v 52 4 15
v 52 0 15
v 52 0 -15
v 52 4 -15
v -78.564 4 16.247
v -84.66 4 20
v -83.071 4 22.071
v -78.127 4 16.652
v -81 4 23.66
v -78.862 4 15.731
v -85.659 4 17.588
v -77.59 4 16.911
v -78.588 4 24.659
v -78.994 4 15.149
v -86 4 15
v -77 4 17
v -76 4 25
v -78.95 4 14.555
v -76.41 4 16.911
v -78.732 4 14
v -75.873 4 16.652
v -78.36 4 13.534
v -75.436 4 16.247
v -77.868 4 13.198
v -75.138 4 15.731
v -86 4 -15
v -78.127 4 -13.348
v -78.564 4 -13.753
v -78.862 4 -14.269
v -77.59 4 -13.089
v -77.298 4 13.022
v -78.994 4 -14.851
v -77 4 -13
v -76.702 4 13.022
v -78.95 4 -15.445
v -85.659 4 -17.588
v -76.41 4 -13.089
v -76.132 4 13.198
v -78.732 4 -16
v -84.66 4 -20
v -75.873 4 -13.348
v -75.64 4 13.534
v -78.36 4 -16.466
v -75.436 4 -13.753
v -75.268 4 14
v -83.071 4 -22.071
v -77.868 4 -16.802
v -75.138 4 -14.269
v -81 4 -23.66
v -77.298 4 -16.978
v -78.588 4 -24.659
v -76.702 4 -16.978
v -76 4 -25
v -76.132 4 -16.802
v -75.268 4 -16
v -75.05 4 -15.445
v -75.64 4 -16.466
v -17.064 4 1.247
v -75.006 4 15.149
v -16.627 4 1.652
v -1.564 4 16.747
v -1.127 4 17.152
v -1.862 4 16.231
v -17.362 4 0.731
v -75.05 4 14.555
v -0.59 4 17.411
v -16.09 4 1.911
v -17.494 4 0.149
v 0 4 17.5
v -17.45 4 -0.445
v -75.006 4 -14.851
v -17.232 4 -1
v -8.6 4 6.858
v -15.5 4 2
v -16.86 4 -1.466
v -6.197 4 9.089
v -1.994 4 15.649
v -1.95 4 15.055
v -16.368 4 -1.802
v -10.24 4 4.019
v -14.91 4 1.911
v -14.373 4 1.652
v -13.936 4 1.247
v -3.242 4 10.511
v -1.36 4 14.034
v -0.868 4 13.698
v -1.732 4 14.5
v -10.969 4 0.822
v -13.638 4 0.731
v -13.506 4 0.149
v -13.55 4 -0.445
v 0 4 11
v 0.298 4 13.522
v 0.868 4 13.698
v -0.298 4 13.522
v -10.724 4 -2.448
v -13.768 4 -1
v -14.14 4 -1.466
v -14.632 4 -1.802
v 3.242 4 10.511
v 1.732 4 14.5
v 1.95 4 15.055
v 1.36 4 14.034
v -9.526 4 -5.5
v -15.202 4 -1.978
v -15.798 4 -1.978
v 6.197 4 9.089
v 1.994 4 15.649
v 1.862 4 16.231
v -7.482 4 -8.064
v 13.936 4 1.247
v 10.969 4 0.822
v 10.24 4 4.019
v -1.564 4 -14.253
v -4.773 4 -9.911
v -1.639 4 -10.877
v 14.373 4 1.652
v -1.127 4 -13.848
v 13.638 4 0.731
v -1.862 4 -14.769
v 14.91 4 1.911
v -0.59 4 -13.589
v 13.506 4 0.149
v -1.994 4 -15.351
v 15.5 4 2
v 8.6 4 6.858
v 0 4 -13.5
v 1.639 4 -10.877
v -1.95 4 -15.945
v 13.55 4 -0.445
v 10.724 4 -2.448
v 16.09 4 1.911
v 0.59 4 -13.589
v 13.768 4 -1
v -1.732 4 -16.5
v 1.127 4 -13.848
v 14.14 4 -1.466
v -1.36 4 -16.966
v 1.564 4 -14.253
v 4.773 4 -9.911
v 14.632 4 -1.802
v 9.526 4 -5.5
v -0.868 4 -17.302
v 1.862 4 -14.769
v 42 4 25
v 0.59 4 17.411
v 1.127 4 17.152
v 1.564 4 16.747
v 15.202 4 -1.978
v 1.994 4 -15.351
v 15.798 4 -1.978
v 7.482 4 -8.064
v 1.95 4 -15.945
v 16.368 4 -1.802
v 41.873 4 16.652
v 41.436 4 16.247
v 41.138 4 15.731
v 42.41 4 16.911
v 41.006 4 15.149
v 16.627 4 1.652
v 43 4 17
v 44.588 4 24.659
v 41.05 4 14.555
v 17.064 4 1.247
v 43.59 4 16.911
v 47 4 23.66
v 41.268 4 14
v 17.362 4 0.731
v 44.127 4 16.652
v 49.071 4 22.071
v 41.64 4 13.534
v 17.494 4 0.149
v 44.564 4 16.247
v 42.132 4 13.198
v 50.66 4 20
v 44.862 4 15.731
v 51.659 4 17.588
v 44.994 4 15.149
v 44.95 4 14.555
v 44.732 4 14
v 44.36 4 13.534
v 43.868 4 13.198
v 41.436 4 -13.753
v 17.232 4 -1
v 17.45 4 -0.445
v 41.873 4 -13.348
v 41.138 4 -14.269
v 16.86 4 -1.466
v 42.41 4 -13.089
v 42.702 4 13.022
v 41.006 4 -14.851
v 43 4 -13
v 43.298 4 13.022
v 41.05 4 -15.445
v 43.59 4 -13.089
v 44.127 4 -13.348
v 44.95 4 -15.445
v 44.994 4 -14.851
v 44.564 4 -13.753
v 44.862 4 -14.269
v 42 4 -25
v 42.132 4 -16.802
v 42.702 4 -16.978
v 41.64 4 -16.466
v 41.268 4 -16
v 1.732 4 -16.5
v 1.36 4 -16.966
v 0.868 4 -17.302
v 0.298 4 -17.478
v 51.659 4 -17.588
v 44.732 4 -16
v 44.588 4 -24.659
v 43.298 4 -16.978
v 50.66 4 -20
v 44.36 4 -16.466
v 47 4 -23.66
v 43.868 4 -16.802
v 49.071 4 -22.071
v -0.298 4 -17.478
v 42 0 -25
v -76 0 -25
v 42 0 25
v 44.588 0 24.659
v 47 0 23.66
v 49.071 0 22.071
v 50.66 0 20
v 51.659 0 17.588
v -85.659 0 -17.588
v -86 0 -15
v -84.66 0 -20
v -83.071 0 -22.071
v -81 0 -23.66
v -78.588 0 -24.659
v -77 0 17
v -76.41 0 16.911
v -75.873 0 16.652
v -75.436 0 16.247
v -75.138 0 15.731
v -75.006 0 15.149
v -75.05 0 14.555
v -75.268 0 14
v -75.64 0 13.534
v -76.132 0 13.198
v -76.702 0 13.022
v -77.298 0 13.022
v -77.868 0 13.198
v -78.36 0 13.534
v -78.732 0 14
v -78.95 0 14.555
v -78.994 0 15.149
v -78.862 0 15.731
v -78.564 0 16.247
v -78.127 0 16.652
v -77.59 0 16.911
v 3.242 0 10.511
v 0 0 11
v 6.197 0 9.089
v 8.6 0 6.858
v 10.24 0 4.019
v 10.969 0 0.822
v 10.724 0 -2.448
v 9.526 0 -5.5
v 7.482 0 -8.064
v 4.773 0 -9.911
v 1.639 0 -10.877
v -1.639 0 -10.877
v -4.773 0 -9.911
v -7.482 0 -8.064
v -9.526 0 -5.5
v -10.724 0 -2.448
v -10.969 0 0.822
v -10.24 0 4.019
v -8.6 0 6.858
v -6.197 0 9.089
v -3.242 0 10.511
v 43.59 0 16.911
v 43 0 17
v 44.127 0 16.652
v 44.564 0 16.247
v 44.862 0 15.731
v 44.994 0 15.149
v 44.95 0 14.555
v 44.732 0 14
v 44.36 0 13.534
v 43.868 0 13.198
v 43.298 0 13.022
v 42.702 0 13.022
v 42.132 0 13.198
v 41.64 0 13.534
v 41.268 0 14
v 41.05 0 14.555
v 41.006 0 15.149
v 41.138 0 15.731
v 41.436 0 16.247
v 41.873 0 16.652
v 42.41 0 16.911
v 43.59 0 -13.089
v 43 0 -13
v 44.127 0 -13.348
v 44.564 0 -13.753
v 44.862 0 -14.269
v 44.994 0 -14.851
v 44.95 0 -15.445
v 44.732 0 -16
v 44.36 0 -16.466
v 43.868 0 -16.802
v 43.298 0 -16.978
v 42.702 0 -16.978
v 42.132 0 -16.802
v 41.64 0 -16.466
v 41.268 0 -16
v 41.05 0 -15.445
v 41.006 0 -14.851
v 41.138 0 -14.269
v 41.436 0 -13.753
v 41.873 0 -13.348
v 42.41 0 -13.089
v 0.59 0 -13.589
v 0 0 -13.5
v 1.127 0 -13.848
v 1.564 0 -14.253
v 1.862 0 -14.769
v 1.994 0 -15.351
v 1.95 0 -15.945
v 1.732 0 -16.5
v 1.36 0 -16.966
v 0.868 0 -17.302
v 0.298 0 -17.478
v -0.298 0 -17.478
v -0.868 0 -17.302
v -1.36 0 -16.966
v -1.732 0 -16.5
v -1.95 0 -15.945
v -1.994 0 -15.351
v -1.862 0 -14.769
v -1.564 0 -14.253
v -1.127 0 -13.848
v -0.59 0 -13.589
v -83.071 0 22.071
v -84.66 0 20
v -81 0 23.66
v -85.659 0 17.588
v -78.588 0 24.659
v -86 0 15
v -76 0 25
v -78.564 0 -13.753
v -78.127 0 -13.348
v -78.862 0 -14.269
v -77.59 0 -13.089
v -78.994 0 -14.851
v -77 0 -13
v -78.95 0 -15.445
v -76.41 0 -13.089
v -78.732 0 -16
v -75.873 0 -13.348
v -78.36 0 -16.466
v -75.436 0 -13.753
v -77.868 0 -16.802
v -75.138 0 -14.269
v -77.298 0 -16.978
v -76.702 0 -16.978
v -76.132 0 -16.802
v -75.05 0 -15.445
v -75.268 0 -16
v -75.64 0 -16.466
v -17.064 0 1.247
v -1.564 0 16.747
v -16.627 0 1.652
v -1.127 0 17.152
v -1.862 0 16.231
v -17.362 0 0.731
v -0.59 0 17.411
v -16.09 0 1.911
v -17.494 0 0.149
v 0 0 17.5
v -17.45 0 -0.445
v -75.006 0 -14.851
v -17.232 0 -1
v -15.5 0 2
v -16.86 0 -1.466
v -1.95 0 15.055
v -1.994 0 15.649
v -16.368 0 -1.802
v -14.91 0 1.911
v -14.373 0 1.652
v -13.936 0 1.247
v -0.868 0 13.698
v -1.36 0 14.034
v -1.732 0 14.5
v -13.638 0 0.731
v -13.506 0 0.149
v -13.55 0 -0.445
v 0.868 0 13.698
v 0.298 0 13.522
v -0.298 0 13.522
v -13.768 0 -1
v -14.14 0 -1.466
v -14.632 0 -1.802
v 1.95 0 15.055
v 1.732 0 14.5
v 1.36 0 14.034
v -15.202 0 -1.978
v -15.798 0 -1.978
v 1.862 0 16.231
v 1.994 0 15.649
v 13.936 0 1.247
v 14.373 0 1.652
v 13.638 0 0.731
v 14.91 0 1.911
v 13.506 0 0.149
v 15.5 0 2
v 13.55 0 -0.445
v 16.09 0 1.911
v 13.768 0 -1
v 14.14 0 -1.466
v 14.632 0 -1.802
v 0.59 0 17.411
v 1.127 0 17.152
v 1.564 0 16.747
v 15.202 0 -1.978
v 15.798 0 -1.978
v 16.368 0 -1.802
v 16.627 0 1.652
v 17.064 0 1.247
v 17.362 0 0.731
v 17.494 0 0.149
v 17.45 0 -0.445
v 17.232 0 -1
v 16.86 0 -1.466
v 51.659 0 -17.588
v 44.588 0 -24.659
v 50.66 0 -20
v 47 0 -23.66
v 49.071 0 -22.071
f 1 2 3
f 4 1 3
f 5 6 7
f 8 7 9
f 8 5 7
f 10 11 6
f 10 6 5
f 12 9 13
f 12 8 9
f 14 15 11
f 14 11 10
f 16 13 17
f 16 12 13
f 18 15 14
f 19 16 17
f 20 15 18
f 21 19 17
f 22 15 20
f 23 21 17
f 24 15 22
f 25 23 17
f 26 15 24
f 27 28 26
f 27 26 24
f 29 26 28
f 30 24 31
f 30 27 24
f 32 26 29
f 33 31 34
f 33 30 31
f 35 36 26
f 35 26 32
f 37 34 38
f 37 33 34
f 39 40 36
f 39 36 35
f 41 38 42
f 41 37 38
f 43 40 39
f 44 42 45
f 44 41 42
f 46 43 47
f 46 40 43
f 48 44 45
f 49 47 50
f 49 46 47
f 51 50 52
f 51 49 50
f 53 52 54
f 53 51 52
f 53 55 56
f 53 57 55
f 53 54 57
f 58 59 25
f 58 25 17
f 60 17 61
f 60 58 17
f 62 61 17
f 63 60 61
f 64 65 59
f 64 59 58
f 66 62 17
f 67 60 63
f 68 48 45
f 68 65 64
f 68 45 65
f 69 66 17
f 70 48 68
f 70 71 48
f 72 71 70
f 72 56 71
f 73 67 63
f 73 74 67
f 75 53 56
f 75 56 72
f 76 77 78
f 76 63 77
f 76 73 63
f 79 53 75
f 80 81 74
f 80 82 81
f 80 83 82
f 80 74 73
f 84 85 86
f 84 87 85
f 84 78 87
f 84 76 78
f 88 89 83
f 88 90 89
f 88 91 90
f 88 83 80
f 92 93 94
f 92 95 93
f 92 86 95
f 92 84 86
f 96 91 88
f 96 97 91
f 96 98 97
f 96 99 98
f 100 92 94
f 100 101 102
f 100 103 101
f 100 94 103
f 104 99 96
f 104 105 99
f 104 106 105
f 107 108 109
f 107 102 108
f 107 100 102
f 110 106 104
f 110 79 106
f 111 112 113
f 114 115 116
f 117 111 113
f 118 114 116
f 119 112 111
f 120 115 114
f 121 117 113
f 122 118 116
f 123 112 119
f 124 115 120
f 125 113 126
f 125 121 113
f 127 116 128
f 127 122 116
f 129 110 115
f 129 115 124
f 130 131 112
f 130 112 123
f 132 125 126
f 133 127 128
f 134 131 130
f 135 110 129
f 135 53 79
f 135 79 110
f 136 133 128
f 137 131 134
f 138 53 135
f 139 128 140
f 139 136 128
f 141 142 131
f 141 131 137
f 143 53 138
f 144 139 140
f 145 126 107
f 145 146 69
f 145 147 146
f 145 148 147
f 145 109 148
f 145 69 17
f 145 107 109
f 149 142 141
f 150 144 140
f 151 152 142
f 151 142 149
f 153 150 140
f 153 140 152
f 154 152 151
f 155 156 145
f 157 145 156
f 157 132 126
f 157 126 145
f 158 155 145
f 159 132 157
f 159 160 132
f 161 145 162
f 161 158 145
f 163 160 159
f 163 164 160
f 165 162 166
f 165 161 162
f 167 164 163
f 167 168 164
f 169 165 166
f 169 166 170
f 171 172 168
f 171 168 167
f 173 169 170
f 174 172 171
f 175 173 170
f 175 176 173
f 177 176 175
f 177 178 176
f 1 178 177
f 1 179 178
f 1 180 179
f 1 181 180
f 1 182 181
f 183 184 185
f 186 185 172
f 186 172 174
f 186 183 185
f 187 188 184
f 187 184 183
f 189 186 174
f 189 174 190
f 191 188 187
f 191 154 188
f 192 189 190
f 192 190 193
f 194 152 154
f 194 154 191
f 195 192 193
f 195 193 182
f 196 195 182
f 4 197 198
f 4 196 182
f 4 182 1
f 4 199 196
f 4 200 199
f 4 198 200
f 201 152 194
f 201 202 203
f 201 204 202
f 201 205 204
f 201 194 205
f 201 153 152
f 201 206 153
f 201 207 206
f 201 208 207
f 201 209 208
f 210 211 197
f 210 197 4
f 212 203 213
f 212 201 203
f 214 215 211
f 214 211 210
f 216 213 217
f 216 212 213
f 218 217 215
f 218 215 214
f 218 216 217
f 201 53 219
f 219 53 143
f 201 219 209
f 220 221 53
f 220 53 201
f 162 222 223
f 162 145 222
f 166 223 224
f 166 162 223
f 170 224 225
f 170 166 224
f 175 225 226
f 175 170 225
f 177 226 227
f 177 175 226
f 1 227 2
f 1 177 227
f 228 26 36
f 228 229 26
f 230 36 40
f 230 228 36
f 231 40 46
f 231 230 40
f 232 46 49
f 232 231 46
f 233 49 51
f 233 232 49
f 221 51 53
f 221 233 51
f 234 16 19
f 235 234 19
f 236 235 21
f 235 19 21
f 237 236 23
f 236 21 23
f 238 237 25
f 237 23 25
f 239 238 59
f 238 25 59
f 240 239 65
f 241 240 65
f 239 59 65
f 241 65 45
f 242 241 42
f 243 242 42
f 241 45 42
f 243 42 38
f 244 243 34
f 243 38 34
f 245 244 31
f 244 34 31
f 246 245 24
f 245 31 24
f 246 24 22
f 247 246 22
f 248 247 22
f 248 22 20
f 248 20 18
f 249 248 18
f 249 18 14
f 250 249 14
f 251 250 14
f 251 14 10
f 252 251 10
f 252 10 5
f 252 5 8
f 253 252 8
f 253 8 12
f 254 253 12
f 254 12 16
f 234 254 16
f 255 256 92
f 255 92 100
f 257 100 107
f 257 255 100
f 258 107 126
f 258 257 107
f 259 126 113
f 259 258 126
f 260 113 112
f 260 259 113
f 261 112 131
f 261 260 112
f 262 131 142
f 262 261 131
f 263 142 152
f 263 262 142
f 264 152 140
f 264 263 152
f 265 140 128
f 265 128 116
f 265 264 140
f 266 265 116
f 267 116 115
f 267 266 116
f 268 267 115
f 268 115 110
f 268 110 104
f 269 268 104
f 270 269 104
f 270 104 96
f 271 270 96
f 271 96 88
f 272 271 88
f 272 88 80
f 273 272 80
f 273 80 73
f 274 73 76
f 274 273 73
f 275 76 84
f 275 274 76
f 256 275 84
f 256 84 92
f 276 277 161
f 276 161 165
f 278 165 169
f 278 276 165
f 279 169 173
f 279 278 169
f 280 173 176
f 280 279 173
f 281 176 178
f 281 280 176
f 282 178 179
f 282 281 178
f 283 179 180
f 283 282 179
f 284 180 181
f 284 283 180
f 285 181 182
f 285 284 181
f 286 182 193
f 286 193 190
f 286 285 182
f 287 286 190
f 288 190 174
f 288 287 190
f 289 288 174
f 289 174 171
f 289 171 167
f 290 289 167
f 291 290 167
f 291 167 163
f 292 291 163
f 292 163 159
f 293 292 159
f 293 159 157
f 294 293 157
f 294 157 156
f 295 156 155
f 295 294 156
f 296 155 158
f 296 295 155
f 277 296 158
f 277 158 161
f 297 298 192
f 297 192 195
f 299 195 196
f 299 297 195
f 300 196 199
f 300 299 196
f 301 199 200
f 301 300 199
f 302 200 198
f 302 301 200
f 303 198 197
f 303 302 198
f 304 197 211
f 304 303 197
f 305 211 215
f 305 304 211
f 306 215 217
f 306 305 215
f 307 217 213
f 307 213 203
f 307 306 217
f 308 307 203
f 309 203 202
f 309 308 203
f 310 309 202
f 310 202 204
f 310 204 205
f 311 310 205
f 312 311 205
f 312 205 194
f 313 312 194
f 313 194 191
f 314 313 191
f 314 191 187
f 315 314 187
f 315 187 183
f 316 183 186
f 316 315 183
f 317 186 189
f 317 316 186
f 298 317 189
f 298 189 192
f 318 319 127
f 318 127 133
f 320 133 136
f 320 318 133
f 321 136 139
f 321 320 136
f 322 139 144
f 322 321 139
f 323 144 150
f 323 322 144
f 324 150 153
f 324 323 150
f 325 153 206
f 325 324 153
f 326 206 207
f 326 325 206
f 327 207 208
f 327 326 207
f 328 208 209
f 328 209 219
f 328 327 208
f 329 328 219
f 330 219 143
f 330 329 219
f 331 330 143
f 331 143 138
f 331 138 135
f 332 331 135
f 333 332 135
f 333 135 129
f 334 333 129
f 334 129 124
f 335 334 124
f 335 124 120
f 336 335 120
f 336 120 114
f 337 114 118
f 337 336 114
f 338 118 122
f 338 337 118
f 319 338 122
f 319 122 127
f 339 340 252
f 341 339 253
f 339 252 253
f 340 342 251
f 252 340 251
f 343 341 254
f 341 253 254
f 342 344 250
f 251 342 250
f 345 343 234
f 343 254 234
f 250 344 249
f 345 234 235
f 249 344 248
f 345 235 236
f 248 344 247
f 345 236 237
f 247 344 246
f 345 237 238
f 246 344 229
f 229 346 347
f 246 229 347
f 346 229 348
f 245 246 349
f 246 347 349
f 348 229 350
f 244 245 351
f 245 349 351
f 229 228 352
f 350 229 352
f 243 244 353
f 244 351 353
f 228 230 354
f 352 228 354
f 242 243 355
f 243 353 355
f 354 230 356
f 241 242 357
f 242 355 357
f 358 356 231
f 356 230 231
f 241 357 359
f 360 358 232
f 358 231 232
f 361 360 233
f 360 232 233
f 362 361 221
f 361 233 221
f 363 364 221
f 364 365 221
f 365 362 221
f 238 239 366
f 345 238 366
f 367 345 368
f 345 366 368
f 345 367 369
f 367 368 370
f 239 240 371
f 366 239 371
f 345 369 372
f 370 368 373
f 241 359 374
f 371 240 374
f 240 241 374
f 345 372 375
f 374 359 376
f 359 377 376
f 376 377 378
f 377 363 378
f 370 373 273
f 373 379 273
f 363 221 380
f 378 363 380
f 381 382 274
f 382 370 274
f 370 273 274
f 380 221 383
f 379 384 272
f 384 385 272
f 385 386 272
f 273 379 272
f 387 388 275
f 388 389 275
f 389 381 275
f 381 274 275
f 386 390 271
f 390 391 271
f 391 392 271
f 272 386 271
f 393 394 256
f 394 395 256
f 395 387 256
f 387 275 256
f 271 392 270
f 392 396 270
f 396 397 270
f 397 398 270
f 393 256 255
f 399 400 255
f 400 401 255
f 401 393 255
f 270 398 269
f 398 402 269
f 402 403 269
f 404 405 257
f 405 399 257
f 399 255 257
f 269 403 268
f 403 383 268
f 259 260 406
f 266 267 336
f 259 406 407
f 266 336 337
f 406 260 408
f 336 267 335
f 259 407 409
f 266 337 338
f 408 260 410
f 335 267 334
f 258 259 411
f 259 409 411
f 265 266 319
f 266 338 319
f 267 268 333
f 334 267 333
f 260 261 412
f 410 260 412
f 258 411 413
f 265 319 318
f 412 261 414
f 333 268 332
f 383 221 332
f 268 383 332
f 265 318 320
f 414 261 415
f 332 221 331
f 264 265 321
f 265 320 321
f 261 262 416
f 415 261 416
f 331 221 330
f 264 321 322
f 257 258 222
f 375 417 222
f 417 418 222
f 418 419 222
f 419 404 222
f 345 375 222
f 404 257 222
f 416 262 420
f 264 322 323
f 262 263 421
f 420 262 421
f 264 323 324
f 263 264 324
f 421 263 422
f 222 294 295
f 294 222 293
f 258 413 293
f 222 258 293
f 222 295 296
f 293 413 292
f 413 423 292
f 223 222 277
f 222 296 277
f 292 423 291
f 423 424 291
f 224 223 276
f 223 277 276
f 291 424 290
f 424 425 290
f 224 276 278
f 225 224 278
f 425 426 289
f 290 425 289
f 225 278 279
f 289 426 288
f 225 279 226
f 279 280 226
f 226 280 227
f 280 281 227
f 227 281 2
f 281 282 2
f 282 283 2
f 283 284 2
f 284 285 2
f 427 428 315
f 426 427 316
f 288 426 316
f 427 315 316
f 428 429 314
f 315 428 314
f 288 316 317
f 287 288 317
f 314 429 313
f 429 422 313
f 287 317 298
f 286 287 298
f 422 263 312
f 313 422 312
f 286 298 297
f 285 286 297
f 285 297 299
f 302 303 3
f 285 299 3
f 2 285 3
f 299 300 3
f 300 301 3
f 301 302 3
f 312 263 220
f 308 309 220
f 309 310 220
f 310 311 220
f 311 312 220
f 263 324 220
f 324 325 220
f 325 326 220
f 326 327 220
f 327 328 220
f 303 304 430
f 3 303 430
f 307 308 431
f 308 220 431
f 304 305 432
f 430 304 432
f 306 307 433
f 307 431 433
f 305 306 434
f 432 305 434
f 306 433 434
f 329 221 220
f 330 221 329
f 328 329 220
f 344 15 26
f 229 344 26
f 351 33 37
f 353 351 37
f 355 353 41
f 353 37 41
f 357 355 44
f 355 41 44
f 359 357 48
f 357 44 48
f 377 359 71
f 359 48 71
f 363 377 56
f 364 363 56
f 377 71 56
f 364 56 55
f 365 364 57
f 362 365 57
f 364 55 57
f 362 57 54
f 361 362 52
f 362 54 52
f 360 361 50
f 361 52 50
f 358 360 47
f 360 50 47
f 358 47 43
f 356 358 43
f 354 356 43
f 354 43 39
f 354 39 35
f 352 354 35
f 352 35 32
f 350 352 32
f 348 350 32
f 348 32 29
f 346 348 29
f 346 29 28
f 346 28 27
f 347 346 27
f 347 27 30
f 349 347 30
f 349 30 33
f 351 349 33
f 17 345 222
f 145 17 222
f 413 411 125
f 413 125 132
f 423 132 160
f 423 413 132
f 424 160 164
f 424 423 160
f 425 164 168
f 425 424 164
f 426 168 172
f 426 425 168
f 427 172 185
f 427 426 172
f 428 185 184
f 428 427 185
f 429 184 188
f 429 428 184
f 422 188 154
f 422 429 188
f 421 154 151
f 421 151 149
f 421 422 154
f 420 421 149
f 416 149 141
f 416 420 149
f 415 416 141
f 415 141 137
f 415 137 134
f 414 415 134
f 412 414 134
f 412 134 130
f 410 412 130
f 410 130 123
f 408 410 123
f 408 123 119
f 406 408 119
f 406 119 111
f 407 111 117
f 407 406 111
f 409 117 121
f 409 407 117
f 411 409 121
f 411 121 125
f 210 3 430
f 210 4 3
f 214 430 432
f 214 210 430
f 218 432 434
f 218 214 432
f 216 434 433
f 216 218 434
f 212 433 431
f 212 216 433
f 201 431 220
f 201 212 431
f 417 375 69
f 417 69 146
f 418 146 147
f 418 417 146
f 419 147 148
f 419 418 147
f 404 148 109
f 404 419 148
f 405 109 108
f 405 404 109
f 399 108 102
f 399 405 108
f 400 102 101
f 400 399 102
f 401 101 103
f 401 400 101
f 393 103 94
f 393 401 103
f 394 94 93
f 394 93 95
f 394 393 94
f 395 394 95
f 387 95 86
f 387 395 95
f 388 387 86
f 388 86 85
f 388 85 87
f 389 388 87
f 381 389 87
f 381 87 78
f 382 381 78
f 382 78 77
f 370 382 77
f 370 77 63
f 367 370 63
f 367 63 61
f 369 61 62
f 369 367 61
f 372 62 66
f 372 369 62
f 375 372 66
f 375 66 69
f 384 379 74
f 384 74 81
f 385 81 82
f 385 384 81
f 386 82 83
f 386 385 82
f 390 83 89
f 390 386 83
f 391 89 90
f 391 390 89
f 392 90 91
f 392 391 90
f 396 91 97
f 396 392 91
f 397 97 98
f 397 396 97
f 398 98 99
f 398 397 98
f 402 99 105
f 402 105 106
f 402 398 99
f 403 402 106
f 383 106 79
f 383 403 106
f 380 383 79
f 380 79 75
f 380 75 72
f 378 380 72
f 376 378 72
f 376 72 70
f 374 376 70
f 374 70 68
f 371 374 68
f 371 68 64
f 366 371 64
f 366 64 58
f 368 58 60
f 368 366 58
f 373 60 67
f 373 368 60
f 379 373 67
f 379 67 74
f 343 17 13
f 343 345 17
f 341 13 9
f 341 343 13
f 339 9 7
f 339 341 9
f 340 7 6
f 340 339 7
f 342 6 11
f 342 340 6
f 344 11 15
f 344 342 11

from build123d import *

# Parameters (mm, degrees)
SKETCH_1_W          = 143
SKETCH_1_H          = 50
SKETCH_1_R          = 2
SKETCH_1_R_2        = 11
EXTRUDE_1_DEPTH     = 4
SKETCH_4_W          = 5
SKETCH_4_H          = 50
CUT_EXTRUDE_3_DEPTH = 95.45633912
SKETCH_5_R          = 2
CUT_EXTRUDE_4_DEPTH = 90.649316785
FILLET_1_R          = 10


with BuildPart() as part:
    # 草图1 → 凸台-拉伸1 (new body)
    with BuildSketch(Plane(origin=(0, 0, 0), x_dir=(1, 0, 0), z_dir=(0, 1, 0))):
        with Locations((-19.5, 0)):
            Rectangle(SKETCH_1_W, SKETCH_1_H)
        with Locations(Location((-15.5, 0, 0), (0, 0, 270))):
            Circle(SKETCH_1_R, mode=Mode.SUBTRACT)
        with Locations(Location((0, 15.5, 0), (0, 0, 270))):
            Circle(SKETCH_1_R, mode=Mode.SUBTRACT)
        with Locations(Location((0, -15.5, 0), (0, 0, 270))):
            Circle(SKETCH_1_R, mode=Mode.SUBTRACT)
        with Locations(Location((43, -15, 0), (0, 0, 270))):
            Circle(SKETCH_1_R, mode=Mode.SUBTRACT)
        with Locations(Location((43, 15, 0), (0, 0, 270))):
            Circle(SKETCH_1_R, mode=Mode.SUBTRACT)
        with Locations(Location((0, 0, 0), (0, 0, 270))):
            Circle(SKETCH_1_R_2, mode=Mode.SUBTRACT)
        with Locations(Location((15.5, 0, 0), (0, 0, 270))):
            Circle(SKETCH_1_R, mode=Mode.SUBTRACT)
    extrude(amount=EXTRUDE_1_DEPTH)

    # 草图4 → 切除-拉伸3 (cut, through all)
    with BuildSketch(Plane(origin=(0, 4, 0), x_dir=(1, 0, 0), z_dir=(0, 1, 0))):
        with Locations((-88.5, 0)):
            Rectangle(SKETCH_4_W, SKETCH_4_H)
    extrude(amount=-CUT_EXTRUDE_3_DEPTH, mode=Mode.SUBTRACT)

    # 草图5 → 切除-拉伸4 (cut, through all)
    with BuildSketch(Plane(origin=(0, 4, 0), x_dir=(1, 0, 0), z_dir=(0, 1, 0))):
        with Locations(Location((-77, 15, 0), (0, 0, 270))):
            Circle(SKETCH_5_R)
        with Locations(Location((-77, -15, 0), (0, 0, 270))):
            Circle(SKETCH_5_R)
    extrude(amount=-CUT_EXTRUDE_4_DEPTH, mode=Mode.SUBTRACT)

    # 圆角1
    fillet_1_edges = [part.edges().sort_by_distance(p)[0] for p in [
        (52, 2, -25),
        (52, 2, 25),
        (-86, 2, -25),
        (-86, 2, 25),
    ]]
    fillet(fillet_1_edges, radius=FILLET_1_R)


solid = part.part
